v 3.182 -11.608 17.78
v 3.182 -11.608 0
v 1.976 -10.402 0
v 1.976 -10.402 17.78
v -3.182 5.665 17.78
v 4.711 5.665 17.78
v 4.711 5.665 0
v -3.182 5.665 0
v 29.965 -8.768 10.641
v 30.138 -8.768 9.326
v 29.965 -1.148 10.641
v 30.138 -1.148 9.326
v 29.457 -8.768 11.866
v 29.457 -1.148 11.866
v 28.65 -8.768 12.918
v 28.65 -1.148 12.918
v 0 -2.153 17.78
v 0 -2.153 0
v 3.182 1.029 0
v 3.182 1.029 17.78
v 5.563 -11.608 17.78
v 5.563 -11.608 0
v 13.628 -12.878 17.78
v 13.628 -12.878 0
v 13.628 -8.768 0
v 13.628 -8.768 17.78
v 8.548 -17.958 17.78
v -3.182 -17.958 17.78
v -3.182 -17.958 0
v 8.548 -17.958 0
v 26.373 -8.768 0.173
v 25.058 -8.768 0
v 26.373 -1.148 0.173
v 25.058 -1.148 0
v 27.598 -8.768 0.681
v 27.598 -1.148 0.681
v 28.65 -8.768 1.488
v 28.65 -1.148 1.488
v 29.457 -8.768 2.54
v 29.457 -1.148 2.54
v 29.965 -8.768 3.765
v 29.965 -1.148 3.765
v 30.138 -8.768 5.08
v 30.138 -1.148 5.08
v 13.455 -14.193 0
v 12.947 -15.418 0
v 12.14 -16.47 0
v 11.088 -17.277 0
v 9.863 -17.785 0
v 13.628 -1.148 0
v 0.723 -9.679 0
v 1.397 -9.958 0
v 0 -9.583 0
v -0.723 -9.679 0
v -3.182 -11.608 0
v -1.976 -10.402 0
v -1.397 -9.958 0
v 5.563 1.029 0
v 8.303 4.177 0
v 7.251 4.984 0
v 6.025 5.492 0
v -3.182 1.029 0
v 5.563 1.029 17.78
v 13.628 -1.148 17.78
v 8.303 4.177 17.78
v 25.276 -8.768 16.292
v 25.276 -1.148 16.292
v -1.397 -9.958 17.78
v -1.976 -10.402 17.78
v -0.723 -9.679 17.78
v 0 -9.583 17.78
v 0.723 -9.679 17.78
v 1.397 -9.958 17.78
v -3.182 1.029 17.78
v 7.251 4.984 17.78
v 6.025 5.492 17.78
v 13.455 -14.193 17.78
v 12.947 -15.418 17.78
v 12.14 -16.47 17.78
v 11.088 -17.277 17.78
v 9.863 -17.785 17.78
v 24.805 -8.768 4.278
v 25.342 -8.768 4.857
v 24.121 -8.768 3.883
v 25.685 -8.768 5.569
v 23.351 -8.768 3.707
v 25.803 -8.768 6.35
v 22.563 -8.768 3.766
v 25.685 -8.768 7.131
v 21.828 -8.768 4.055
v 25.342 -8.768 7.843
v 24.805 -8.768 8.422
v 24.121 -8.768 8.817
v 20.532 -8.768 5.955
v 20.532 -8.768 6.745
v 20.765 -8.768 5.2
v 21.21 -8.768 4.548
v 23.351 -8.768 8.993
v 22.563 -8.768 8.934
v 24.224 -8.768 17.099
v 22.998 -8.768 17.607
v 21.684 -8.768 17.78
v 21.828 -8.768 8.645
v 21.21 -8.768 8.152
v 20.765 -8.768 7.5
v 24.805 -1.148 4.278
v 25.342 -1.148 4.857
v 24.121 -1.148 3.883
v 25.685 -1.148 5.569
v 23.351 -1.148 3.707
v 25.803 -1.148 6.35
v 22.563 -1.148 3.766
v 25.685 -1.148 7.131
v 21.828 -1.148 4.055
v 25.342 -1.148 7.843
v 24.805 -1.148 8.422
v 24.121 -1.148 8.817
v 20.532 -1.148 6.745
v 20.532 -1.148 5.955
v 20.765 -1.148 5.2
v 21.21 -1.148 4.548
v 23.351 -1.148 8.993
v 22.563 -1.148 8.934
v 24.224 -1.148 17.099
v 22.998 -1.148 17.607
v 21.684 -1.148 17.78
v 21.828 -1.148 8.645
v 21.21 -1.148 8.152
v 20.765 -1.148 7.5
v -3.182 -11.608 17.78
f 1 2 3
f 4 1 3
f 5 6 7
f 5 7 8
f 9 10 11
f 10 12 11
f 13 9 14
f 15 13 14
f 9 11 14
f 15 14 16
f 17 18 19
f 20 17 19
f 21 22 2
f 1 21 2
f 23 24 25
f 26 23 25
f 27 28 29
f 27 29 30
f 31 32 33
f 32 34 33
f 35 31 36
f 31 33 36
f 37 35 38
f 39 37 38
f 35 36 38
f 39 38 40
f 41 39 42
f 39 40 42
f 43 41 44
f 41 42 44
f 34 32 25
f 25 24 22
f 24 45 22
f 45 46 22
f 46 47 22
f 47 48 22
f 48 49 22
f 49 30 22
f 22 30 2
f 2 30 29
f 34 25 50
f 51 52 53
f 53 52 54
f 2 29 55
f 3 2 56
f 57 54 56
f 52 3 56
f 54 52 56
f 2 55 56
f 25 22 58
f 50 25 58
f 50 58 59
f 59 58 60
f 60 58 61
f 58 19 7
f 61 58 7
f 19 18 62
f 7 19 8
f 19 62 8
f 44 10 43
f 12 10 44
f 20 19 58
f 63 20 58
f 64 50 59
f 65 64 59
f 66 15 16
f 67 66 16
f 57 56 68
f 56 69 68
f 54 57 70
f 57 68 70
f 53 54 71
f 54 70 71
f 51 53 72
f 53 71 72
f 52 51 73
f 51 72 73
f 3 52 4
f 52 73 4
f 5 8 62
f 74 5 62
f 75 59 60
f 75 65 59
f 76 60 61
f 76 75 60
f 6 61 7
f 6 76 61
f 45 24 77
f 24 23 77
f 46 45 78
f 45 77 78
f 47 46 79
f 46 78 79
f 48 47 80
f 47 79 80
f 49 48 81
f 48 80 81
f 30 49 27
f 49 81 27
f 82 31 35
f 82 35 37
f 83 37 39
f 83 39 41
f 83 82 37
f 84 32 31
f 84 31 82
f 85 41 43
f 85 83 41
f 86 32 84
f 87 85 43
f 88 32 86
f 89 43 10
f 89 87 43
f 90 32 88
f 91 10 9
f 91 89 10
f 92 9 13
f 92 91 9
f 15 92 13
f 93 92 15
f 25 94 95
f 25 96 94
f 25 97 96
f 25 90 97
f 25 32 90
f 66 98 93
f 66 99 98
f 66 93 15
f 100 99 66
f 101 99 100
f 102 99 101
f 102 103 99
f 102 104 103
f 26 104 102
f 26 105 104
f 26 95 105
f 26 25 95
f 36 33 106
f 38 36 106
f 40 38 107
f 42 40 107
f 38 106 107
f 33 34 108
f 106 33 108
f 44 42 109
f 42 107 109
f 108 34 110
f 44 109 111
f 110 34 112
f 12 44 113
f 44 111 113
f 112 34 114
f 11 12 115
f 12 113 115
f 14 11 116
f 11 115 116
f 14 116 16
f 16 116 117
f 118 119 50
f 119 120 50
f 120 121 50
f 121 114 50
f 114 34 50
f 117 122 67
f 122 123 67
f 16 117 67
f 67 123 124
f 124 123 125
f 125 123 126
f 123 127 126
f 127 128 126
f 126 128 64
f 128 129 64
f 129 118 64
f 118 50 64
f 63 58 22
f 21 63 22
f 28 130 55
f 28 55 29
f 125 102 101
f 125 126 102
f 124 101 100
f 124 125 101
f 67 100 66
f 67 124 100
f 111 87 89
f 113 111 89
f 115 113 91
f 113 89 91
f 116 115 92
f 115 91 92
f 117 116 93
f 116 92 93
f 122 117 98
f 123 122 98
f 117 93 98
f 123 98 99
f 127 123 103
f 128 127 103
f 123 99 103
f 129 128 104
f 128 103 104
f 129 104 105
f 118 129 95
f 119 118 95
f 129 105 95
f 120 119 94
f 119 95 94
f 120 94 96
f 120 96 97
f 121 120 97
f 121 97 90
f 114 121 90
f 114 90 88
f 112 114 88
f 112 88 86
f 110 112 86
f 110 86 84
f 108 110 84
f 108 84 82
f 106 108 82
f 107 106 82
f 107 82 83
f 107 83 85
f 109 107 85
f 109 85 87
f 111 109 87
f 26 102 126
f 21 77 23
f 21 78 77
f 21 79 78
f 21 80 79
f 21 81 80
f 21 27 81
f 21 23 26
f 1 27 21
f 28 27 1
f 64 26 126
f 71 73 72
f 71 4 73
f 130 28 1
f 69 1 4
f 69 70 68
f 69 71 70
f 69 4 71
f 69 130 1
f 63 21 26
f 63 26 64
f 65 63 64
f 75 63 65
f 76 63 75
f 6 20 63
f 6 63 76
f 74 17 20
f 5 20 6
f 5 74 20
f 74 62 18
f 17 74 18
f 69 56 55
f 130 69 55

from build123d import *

# Parameters (mm, degrees)
F1_DEPTH = 17.78
F2_W     = 7.62
F2_H     = 17.78
F3_DEPTH = 16.51
F4_SIZE  = 6.35
F5_R     = 2.65
F6_DEPTH = 25.4
F7_R     = 2.794
F8_R     = 5.08
F9_R     = 5.08
F10_R    = 5.08
F11_R    = 5.08


# Not quite as in the source:
# - a feature names something its author has since deleted; it is built from what else it names


with BuildPart() as f1:
    # F0 (on Top) → F1 (new body)
    with BuildSketch(Plane.XY):
        Polygon((5.5632305153, 1.0289779667), (5.5632305153, -11.6080572072), (3.1819805153, -11.6080572072), (0, -8.4260766918), (-3.1819805153, -11.6080572072), (-3.1819805153, -17.9580572072), (13.6277864288, -17.9580572072), (13.6277864288, -1.148290263), (6.8148051953, 5.6646909705), (-0.4051948047, 5.6646909705), (-3.1819805153, 5.6646909705), (-3.1819805153, 1.0289779667), (0, -2.1530025487), (3.1819805153, 1.0289779667), align=None)
    extrude(amount=F1_DEPTH)

    # F2 (on face) → F3 (join)
    with BuildSketch(Plane.YZ.offset(13.6277864288)):
        with Locations((-4.958290263, 8.89)):
            Rectangle(F2_W, F2_H)
    extrude(amount=F3_DEPTH)

    # F4
    f4_edges = [f1.edges().sort_by_distance(p)[0] for p in [
        (30.137786, -4.95829, 17.78),
    ]]
    chamfer(f4_edges, length=F4_SIZE)

    # F5 (on face) → F6 (cut)
    with BuildSketch(Plane.XZ.offset(8.768290263)):
        with Locations((23.1527864288, 6.35)):
            Circle(F5_R)
    extrude(amount=-F6_DEPTH, mode=Mode.SUBTRACT)

    # F7
    f7_edges = [f1.edges().sort_by_distance(p)[0] for p in [
        (0, -8.426077, 8.89),
    ]]
    fillet(f7_edges, radius=F7_R)

    # F8
    f8_edges = [f1.edges().sort_by_distance(p)[0] for p in [
        (6.814805, 5.664691, 8.89),
    ]]
    fillet(f8_edges, radius=F8_R)

    # F9
    f9_edges = [f1.edges().sort_by_distance(p)[0] for p in [
        (30.137786, -4.95829, 0),
    ]]
    fillet(f9_edges, radius=F9_R)

    # F10
    f10_edges = [f1.edges().sort_by_distance(p)[0] for p in [
        (13.627786, -17.958057, 8.89),
    ]]
    fillet(f10_edges, radius=F10_R)

    # F11
    f11_edges = [f1.edges().sort_by_distance(p)[0] for p in [
        (30.137786, -4.95829, 11.43),
        (23.787786, -4.95829, 17.78),
    ]]
    fillet(f11_edges, radius=F11_R)


solid = f1.part
